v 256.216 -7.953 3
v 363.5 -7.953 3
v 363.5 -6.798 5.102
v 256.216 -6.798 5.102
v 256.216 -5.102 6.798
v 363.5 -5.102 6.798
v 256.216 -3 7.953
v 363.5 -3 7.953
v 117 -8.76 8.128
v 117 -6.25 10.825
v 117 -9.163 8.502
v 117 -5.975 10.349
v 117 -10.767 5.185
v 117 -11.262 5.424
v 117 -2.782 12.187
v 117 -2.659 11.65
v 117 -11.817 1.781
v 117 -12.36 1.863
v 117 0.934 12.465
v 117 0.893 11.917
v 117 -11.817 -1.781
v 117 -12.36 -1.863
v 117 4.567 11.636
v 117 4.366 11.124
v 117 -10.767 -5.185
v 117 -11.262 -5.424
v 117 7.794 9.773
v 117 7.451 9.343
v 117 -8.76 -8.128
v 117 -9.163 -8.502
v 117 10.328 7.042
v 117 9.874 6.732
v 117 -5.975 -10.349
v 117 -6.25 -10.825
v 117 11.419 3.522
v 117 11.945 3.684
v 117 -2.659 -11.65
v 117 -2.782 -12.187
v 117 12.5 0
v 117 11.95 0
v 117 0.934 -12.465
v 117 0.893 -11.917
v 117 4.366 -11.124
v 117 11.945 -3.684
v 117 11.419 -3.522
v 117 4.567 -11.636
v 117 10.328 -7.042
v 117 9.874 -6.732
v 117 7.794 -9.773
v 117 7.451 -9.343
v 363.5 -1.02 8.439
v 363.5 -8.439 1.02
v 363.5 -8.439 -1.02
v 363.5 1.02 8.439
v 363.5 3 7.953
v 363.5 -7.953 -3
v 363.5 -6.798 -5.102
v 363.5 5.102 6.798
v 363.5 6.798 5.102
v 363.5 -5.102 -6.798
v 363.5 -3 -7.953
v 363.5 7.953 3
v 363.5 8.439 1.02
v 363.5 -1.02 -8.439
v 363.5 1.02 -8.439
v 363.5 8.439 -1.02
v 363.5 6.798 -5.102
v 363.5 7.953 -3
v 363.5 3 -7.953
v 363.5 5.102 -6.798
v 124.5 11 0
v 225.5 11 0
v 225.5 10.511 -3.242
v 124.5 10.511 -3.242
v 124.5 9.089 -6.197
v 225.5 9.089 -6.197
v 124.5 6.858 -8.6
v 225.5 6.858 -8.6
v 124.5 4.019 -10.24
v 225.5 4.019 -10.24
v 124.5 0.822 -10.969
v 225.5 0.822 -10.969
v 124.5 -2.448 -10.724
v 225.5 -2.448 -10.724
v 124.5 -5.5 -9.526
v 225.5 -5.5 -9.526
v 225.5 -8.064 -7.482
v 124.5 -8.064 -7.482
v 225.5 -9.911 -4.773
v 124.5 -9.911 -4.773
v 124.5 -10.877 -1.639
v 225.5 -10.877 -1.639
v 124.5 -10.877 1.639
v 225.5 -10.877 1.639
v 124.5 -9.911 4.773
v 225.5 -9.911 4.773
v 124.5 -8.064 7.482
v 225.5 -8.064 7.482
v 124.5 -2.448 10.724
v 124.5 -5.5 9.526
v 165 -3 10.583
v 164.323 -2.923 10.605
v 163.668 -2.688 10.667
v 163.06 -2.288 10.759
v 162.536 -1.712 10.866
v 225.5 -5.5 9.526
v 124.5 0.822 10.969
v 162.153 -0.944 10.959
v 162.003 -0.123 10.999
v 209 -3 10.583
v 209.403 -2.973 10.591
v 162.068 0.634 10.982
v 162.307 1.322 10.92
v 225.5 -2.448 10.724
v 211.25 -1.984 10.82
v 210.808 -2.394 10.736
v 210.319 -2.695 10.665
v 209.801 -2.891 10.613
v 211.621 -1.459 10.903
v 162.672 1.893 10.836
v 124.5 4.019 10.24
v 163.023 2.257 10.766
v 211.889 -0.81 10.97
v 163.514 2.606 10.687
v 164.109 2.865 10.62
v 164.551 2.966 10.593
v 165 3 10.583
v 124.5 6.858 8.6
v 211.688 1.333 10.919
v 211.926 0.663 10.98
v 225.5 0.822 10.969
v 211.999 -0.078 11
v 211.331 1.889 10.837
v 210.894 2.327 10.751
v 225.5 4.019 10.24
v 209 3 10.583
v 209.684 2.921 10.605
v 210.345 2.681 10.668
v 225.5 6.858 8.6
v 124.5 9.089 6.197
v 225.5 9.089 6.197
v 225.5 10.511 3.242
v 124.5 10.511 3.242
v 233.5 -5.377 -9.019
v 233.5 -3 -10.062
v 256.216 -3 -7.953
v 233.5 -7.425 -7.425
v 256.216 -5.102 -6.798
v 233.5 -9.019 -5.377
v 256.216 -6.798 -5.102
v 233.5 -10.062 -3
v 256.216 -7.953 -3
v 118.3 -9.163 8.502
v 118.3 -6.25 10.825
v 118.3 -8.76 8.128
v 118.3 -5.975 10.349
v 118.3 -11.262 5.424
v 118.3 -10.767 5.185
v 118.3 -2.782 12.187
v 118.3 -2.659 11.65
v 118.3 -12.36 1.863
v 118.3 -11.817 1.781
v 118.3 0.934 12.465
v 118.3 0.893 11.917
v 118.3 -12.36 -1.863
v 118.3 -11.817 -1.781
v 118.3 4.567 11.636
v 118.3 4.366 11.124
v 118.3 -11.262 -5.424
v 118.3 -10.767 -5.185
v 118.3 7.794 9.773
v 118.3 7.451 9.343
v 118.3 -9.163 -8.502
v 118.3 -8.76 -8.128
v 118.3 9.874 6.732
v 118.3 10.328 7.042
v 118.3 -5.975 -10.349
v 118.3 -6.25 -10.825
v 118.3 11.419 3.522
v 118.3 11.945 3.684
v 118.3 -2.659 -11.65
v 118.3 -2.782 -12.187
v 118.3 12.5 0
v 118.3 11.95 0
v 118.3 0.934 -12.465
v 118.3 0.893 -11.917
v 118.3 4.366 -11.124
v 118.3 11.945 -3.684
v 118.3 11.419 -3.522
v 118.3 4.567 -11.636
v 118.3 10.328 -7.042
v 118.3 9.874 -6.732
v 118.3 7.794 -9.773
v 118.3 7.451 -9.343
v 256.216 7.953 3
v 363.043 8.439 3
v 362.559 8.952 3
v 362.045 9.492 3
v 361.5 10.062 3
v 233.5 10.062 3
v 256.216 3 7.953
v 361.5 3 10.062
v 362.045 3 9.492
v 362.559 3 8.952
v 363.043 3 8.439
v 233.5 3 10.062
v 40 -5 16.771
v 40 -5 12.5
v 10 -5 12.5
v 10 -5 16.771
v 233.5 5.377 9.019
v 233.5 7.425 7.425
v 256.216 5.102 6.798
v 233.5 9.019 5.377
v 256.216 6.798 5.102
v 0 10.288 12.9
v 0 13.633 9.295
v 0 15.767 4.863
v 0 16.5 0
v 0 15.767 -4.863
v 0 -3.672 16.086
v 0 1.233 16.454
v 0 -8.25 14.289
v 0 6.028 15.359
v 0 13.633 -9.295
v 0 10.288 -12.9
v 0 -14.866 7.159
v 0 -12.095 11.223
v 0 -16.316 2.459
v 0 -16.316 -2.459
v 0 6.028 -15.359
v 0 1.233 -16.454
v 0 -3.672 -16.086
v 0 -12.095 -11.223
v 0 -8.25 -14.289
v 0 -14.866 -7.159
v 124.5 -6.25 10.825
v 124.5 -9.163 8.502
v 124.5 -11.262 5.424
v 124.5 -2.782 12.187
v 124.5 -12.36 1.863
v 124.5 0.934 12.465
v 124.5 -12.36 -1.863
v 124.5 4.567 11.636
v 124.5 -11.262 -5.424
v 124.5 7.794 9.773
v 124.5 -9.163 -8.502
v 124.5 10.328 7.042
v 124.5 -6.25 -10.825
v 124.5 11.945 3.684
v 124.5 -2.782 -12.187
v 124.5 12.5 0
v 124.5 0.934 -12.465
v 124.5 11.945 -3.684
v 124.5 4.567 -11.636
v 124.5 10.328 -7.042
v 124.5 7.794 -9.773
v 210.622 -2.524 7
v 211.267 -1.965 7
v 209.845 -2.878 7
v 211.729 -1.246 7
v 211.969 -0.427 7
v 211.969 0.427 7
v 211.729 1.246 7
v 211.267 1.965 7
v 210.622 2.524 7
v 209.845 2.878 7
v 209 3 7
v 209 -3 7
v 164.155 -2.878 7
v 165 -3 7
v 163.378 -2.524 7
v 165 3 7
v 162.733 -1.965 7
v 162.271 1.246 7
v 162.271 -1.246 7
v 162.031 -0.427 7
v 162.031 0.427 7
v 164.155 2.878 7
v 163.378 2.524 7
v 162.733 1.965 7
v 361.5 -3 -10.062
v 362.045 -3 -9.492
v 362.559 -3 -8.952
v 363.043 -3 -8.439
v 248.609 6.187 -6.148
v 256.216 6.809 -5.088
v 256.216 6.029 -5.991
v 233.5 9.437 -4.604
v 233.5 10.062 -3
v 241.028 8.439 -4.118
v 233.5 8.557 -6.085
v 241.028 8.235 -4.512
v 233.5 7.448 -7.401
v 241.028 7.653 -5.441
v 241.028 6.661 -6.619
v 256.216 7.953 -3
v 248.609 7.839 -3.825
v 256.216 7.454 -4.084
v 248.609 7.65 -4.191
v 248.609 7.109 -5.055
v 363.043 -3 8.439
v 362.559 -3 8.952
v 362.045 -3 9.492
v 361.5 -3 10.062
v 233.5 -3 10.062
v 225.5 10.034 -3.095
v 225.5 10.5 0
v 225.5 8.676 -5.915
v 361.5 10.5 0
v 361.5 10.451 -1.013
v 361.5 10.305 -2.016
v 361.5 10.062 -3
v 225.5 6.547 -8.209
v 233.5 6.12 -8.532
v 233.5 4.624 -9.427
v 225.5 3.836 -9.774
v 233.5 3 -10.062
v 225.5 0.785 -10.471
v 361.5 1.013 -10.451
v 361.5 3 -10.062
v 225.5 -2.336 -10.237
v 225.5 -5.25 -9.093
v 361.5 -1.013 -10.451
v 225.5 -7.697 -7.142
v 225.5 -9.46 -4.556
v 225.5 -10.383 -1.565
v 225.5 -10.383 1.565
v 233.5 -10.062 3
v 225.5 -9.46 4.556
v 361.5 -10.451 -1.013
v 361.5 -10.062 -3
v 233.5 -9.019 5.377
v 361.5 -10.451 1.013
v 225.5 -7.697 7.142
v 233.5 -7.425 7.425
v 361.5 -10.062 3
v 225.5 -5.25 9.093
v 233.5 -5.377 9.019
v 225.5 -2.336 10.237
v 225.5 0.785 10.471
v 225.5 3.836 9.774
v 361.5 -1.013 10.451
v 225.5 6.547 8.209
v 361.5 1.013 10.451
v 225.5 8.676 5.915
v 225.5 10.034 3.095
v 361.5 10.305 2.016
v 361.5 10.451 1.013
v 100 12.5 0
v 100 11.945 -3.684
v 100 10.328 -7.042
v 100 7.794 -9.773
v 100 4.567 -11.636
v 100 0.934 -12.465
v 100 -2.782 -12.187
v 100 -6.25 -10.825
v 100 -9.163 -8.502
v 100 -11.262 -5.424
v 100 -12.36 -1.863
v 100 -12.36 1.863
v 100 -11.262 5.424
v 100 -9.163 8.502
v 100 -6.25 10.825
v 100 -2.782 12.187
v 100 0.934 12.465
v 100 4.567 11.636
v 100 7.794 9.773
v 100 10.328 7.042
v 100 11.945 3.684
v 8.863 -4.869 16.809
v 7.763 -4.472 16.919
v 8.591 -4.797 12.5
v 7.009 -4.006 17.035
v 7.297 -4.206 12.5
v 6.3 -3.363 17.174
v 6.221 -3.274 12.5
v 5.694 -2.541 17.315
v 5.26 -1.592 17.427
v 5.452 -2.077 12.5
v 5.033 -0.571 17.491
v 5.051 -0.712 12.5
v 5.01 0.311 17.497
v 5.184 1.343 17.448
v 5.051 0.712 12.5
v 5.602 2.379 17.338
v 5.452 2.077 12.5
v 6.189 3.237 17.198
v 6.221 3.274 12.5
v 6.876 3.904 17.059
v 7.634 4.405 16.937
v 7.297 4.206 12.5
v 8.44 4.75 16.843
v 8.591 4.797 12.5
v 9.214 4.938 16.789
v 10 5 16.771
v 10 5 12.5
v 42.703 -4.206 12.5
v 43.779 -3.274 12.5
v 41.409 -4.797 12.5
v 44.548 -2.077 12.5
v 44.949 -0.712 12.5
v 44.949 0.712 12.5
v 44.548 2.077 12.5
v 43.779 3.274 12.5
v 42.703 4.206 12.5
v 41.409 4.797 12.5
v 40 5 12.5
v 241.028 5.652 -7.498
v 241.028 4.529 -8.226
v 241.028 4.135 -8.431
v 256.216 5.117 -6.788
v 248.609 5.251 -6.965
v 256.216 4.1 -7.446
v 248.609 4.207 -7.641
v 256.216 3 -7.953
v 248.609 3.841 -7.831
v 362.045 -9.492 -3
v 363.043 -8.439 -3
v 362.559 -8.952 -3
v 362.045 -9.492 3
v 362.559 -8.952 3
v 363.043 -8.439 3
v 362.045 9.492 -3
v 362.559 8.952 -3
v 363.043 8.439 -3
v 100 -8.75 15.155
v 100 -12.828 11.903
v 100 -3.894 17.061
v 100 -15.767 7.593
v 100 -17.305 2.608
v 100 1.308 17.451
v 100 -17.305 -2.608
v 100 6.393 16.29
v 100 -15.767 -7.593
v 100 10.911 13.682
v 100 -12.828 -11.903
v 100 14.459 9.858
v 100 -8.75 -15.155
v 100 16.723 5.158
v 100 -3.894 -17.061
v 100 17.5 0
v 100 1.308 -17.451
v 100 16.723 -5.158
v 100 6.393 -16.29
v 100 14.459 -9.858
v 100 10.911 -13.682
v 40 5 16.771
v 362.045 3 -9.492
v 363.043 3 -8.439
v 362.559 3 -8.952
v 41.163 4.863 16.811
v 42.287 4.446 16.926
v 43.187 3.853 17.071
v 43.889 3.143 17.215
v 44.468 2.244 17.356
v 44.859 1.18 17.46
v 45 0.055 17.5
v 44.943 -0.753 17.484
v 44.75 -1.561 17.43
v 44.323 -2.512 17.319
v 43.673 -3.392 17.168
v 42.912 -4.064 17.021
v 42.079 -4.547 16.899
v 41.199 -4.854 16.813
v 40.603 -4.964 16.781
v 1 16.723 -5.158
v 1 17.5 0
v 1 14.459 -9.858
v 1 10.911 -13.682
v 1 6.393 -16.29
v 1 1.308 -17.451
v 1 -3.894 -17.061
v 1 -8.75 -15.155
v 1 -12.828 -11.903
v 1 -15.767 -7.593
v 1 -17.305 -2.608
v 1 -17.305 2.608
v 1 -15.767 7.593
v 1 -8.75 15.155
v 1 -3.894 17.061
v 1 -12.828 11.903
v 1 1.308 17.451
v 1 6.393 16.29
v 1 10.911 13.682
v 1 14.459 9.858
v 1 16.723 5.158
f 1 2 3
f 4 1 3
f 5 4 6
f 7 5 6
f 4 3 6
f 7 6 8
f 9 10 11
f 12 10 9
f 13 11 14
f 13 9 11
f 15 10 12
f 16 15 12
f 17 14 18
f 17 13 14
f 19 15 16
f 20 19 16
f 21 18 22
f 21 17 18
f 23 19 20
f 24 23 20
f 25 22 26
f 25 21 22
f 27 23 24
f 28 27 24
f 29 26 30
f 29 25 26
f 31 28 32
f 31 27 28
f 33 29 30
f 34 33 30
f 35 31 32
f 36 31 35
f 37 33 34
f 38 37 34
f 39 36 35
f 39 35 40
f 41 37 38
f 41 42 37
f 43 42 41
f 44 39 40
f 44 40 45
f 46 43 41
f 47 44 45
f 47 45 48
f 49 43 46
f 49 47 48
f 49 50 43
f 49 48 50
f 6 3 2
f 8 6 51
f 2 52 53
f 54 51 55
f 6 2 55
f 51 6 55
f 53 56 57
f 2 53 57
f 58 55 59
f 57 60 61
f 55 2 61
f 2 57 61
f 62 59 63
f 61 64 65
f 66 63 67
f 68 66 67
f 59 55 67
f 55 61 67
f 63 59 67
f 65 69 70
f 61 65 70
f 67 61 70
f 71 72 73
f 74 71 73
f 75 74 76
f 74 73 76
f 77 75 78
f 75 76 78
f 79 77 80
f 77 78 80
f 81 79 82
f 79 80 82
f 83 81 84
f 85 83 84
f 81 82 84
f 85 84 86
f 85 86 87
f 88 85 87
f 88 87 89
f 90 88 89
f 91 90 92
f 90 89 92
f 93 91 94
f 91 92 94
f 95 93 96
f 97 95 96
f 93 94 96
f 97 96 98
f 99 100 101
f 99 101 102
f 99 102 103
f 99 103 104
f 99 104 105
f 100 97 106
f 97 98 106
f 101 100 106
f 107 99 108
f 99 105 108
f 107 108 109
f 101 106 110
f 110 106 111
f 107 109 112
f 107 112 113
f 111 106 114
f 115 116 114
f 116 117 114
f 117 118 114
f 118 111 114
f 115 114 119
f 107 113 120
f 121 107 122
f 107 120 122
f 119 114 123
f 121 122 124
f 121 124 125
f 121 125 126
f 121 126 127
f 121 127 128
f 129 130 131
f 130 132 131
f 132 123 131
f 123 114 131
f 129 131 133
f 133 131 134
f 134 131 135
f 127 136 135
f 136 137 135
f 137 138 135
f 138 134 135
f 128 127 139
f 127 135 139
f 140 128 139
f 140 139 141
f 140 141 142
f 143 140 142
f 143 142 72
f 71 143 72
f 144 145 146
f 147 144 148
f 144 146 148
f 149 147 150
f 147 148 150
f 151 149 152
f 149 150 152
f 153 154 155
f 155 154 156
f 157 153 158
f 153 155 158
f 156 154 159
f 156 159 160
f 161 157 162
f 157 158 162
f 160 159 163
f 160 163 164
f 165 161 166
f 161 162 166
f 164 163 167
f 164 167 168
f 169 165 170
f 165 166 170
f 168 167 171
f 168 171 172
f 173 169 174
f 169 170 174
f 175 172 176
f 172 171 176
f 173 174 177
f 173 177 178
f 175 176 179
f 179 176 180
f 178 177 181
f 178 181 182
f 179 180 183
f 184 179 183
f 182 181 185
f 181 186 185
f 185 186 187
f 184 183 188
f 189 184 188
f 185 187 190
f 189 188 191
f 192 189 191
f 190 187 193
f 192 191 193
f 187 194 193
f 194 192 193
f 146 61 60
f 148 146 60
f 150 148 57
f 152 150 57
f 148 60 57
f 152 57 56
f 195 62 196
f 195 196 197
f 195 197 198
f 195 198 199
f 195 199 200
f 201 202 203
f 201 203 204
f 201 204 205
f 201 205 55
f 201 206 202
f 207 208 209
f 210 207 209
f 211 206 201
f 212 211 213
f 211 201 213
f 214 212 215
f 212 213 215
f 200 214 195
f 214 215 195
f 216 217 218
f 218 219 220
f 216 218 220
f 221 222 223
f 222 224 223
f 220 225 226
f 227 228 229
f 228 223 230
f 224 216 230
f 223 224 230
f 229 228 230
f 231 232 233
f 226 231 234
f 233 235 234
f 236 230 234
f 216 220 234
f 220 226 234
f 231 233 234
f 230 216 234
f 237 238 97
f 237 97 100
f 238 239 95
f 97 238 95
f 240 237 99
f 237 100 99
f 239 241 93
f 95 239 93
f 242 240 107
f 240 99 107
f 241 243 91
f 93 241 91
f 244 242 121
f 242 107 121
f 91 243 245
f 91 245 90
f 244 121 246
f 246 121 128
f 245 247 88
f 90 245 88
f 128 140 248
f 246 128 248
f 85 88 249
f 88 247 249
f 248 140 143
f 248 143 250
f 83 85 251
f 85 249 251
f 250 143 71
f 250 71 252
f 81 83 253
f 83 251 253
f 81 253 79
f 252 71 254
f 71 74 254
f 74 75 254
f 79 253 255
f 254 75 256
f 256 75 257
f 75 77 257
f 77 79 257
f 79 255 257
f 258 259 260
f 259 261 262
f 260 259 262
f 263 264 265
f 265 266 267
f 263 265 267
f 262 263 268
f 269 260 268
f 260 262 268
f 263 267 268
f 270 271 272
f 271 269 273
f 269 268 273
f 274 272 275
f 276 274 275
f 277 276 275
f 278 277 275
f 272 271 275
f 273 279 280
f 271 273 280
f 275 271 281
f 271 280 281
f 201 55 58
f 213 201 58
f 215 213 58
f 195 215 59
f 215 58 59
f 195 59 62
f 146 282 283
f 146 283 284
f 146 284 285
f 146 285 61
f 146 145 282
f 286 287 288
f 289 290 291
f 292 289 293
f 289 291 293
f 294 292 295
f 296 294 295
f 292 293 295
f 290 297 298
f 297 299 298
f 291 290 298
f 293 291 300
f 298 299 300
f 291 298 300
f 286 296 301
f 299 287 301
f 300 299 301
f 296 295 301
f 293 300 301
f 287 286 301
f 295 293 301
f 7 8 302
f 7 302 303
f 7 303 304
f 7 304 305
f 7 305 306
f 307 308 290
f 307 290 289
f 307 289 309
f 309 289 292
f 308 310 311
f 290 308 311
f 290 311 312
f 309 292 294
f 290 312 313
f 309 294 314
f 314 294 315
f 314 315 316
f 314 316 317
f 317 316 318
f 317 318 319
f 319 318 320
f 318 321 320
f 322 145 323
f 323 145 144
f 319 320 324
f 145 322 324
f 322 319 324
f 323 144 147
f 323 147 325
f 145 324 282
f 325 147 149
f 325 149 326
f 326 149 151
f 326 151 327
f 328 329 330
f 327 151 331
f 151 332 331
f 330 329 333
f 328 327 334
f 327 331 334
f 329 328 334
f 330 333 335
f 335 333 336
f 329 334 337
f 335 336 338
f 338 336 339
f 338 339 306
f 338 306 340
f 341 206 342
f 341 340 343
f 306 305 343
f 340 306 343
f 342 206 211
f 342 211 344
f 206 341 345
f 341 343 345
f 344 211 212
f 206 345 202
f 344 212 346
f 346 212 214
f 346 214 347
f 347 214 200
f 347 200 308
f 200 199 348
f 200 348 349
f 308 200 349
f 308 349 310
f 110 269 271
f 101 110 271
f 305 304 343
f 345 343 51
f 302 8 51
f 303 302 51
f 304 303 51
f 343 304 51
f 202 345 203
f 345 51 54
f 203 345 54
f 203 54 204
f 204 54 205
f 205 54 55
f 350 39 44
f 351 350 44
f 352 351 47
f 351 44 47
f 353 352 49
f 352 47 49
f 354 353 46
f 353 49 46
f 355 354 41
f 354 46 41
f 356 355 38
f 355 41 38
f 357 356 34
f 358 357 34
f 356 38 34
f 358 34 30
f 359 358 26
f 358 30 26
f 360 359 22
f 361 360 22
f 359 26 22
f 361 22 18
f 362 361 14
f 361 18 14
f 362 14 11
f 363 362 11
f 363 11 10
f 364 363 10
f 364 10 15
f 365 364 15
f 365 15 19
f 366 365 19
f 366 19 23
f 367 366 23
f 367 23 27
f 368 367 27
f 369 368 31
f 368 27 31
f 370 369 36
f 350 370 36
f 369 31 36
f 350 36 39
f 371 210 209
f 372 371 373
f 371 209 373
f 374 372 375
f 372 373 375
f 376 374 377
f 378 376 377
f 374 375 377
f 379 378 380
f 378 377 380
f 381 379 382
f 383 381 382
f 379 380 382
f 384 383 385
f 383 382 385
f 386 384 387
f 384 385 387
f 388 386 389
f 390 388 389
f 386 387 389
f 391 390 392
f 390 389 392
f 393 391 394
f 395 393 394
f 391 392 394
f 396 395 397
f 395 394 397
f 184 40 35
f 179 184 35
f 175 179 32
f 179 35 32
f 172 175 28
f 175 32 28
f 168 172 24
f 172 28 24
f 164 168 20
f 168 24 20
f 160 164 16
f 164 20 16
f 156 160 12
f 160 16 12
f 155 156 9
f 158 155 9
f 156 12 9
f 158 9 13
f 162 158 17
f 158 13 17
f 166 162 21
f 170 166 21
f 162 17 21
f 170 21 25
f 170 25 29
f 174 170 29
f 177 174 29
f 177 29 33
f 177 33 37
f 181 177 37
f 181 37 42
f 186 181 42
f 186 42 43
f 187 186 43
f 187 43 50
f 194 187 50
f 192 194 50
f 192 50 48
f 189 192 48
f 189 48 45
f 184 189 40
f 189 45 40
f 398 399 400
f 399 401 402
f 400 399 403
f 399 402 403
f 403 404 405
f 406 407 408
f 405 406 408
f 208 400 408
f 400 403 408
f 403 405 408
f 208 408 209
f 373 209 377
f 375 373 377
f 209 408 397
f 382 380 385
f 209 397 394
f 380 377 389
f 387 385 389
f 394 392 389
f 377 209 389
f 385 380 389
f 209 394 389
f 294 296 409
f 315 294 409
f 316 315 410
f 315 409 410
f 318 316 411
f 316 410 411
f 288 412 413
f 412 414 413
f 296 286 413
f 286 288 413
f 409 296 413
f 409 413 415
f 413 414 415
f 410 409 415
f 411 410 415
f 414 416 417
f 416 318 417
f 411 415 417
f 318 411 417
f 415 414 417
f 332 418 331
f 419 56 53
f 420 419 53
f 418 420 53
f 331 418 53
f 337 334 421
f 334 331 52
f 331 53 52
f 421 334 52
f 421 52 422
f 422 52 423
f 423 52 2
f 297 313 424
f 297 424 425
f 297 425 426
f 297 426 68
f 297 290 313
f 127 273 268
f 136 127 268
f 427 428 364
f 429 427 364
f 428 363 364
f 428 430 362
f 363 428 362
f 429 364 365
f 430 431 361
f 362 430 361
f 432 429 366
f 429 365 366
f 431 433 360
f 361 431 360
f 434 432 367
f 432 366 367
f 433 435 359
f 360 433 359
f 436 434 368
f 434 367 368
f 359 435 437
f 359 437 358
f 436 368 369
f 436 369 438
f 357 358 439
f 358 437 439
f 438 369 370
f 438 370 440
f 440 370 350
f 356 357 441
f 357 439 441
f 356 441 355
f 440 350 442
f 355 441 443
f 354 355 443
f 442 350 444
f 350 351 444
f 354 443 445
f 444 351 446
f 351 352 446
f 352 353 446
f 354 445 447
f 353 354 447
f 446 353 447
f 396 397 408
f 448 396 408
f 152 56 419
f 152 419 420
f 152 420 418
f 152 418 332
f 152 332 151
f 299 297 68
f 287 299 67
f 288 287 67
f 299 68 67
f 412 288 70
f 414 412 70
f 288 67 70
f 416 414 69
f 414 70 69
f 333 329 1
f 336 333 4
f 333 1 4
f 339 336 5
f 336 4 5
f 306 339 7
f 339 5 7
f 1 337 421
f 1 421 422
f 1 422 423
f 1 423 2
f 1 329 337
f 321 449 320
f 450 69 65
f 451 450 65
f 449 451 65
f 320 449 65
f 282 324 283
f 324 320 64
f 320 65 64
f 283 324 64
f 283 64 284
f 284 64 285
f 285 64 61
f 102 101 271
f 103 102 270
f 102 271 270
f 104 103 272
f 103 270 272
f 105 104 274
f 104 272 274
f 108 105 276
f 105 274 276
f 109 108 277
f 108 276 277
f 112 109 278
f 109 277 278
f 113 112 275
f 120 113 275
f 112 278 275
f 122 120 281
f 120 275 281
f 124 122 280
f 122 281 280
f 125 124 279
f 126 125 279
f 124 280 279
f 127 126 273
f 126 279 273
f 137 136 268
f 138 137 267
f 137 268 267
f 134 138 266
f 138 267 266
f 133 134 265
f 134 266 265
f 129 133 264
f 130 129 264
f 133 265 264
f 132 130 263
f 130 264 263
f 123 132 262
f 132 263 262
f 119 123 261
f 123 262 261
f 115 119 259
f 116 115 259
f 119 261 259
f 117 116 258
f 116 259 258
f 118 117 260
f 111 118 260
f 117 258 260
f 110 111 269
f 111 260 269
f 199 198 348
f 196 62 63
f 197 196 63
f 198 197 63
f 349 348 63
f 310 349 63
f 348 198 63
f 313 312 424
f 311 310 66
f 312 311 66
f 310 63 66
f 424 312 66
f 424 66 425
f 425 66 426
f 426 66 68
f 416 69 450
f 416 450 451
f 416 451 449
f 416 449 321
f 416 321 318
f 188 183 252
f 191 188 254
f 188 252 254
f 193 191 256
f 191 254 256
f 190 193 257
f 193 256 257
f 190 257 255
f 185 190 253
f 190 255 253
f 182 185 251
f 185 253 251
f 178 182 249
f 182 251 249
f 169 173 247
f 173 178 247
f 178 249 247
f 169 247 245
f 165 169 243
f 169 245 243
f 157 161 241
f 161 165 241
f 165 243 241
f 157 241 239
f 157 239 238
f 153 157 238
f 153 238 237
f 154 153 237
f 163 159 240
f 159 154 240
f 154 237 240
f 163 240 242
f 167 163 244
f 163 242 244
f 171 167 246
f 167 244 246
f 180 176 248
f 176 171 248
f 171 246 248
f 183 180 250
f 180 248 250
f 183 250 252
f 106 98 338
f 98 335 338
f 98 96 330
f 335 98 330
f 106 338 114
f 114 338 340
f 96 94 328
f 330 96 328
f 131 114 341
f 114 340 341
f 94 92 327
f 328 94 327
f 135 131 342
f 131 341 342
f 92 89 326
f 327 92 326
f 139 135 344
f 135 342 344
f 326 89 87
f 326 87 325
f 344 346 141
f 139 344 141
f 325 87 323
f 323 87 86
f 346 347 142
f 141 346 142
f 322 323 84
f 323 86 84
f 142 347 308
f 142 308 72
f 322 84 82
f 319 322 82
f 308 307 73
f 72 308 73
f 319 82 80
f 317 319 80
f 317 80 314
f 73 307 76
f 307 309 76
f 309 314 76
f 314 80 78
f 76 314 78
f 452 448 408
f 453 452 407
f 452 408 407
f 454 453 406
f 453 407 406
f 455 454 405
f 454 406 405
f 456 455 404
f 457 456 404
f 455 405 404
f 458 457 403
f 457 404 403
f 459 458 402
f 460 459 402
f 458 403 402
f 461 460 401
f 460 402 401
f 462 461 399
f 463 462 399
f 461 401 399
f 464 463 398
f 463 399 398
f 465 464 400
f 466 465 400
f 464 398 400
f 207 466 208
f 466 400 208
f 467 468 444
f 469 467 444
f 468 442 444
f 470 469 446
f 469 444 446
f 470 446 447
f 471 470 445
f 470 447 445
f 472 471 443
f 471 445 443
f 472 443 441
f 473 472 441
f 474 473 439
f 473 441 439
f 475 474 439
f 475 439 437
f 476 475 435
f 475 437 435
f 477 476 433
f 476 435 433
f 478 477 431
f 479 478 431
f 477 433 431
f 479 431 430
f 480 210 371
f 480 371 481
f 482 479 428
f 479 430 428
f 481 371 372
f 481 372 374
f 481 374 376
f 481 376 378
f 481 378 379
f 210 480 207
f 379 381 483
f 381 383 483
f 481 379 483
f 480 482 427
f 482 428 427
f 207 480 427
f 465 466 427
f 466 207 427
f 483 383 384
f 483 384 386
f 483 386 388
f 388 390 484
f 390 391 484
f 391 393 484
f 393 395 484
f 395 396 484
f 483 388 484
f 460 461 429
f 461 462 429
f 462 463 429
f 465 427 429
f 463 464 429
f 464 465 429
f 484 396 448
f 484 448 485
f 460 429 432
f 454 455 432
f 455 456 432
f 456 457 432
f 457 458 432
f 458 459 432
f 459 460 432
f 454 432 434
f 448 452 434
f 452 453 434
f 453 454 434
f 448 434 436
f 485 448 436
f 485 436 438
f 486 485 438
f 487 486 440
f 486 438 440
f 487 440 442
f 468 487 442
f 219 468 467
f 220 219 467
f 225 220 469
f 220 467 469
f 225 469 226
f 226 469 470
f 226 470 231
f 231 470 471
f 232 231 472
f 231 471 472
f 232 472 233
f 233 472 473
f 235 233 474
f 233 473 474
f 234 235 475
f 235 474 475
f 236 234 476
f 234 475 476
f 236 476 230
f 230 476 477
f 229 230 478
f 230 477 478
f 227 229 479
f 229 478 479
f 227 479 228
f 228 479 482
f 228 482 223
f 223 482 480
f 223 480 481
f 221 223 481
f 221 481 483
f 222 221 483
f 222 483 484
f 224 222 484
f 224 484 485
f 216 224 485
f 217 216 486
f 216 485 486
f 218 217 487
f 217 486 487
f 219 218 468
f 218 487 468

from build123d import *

# Parameters (mm, degrees)
CHAMFER_1_SIZE      = 1
CHAMFER_2_SIZE      = 2
CUT_EXTRUDE_START   = 17
SKETCH_2_OUTSIDE_W  = 110.37
SKETCH_2_OUTSIDE_H  = 110.37
SKETCH_2_OUTSIDE_R  = 11.95
CUT_EXTRUDE_1_DEPTH = 1.3
CUT_EXTRUDE_2_DEPTH = 130
FILLET_1_R          = 130
CUT_EXTRUDE_START_2 = 7
CUT_EXTRUDE_3_DEPTH = 358.341529437
CUT_EXTRUDE_START_3 = 12.5
CUT_EXTRUDE_4_DEPTH = 352.841529437


with BuildPart() as part:
    # 草图1 → 旋转1 (revolve)
    with BuildSketch(Plane.XY):
        Polygon((0, 0), (0, 17.5), (100, 17.5), (100, 12.5), (124.5, 12.5), (124.5, 11), (225.5, 11), (225.5, 10.5), (363.5, 10.5), (363.5, 0), align=None)
    revolve(axis=Axis((363.5, 0, 0), (-1, 0, 0)))

    # 倒角1
    chamfer_1_edges = [part.edges().sort_by_distance(p)[0] for p in [
        (0, -17.5, 0),
    ]]
    chamfer(chamfer_1_edges, length=CHAMFER_1_SIZE)

    # 倒角2
    chamfer_2_edges = [part.edges().sort_by_distance(p)[0] for p in [
        (363.5, -10.5, 0),
    ]]
    chamfer(chamfer_2_edges, length=CHAMFER_2_SIZE)

    # 草图2 outside → 切除-拉伸1 (cut)
    with BuildSketch(Plane(origin=(100, 0, 0), x_dir=(0, 0, -1), z_dir=(1, 0, 0)).offset(CUT_EXTRUDE_START)):
        Rectangle(SKETCH_2_OUTSIDE_W, SKETCH_2_OUTSIDE_H)
        with Locations(Location((0, 0, 0), (0, 0, 90))):
            Circle(SKETCH_2_OUTSIDE_R, mode=Mode.SUBTRACT)
    extrude(amount=CUT_EXTRUDE_1_DEPTH, mode=Mode.SUBTRACT)

    # 草图3 → 切除-拉伸2 (cut)
    with BuildSketch(Plane(origin=(363.5, 0, 0), x_dir=(0, 0, -1), z_dir=(1, 0, 0))):
        with BuildLine():
            Line((-10.062305899, 3), (-7.95298686, 3))
            ThreePointArc((-7.95298686, 3), (-6.01040764, 6.01040764), (-3, 7.95298686))
            Line((-3, 7.95298686), (-3, 10.062305899))
            ThreePointArc((-3, 10.062305899), (-7.424621202, 7.424621202), (-10.062305899, 3))
        make_face()
        with BuildLine():
            Line((3, 10.062305899), (3, 7.95298686))
            ThreePointArc((3, 7.95298686), (6.01040764, 6.01040764), (7.95298686, 3))
            Line((7.95298686, 3), (10.062305899, 3))
            ThreePointArc((10.062305899, 3), (7.424621202, 7.424621202), (3, 10.062305899))
        make_face()
        with BuildLine():
            ThreePointArc((7.95298686, -3), (6.01040764, -6.01040764), (3, -7.95298686))
            Line((3, -7.95298686), (3, -10.062305899))
            ThreePointArc((3, -10.062305899), (7.424621202, -7.424621202), (10.062305899, -3))
            Line((10.062305899, -3), (7.95298686, -3))
        make_face()
        with BuildLine():
            ThreePointArc((-10.062305899, -3), (-7.424621202, -7.424621202), (-3, -10.062305899))
            Line((-3, -10.062305899), (-3, -7.95298686))
            ThreePointArc((-3, -7.95298686), (-6.01040764, -6.01040764), (-7.95298686, -3))
            Line((-7.95298686, -3), (-10.062305899, -3))
        make_face()
    extrude(amount=-CUT_EXTRUDE_2_DEPTH, mode=Mode.SUBTRACT)

    # 圆角1
    # the kernel refuses this fillet: 130 mm, written as the material it adds along each edge
    with BuildSketch(Plane(origin=(233.5, 0, 0), x_dir=(0, 0.7048818539423689, -0.7093247295722663), z_dir=(0, 0.7093247295722663, 0.7048818539423689))) as fillet_1_piece_1:
        with BuildLine():
            CenterArc((138.5, -22.715633383), FILLET_1_R, 169.936725557, 10.063274443)
            Line((10.5, 0), (8.5, 0))
            Line((8.5, 0), (8.5, -22.715633383))
        make_face()
    revolve(axis=Axis((233.5, 0, 0), (-1, 0, 0)), revolution_arc=359.64)
    with BuildSketch(Plane(origin=(233.5, 0, 0), x_dir=(0, 0.7093247295722621, 0.7048818539423733), z_dir=(0, -0.7048818539423733, 0.7093247295722621))) as fillet_1_piece_2:
        with BuildLine():
            CenterArc((138.5, -22.715633383), FILLET_1_R, 169.936725557, 10.063274443)
            Line((10.5, 0), (8.5, 0))
            Line((8.5, 0), (8.5, -22.715633383))
        make_face()
    revolve(axis=Axis((233.5, 0, 0), (-1, 0, 0)), revolution_arc=359.64)
    with BuildSketch(Plane(origin=(233.5, 0, 0), x_dir=(0, -0.7048818539423463, 0.7093247295722888), z_dir=(0, -0.7093247295722888, -0.7048818539423463))) as fillet_1_piece_3:
        with BuildLine():
            CenterArc((138.5, -22.715633383), FILLET_1_R, 169.936725557, 10.063274443)
            Line((10.5, 0), (8.5, 0))
            Line((8.5, 0), (8.5, -22.715633383))
        make_face()
    revolve(axis=Axis((233.5, 0, 0), (-1, 0, 0)), revolution_arc=359.64)
    with BuildSketch(Plane(origin=(233.5, 0, 0), x_dir=(0, -0.7093247295722879, -0.7048818539423474), z_dir=(0, 0.7048818539423474, -0.7093247295722879))) as fillet_1_piece_4:
        with BuildLine():
            CenterArc((138.5, -22.715633383), FILLET_1_R, 169.936725557, 10.063274443)
            Line((10.5, 0), (8.5, 0))
            Line((8.5, 0), (8.5, -22.715633383))
        make_face()
    revolve(axis=Axis((233.5, 0, 0), (-1, 0, 0)), revolution_arc=359.64)

    # 草图4 → 切除-拉伸3 (cut, through all)
    with BuildSketch(Plane.XY.offset(CUT_EXTRUDE_START_2)):
        with BuildLine():
            Line((165, 3), (209, 3))
            ThreePointArc((209, 3), (212, 0), (209, -3))
            Line((209, -3), (165, -3))
            ThreePointArc((165, -3), (162, 0), (165, 3))
        make_face()
    extrude(amount=CUT_EXTRUDE_3_DEPTH, mode=Mode.SUBTRACT)

    # 草图5 → 切除-拉伸4 (cut, through all)
    with BuildSketch(Plane.XY.offset(CUT_EXTRUDE_START_3)):
        with BuildLine():
            Line((10, 5), (40, 5))
            ThreePointArc((40, 5), (45, 0), (40, -5))
            Line((40, -5), (10, -5))
            ThreePointArc((10, -5), (5, 0), (10, 5))
        make_face()
    extrude(amount=CUT_EXTRUDE_4_DEPTH, mode=Mode.SUBTRACT)


solid = part.part
